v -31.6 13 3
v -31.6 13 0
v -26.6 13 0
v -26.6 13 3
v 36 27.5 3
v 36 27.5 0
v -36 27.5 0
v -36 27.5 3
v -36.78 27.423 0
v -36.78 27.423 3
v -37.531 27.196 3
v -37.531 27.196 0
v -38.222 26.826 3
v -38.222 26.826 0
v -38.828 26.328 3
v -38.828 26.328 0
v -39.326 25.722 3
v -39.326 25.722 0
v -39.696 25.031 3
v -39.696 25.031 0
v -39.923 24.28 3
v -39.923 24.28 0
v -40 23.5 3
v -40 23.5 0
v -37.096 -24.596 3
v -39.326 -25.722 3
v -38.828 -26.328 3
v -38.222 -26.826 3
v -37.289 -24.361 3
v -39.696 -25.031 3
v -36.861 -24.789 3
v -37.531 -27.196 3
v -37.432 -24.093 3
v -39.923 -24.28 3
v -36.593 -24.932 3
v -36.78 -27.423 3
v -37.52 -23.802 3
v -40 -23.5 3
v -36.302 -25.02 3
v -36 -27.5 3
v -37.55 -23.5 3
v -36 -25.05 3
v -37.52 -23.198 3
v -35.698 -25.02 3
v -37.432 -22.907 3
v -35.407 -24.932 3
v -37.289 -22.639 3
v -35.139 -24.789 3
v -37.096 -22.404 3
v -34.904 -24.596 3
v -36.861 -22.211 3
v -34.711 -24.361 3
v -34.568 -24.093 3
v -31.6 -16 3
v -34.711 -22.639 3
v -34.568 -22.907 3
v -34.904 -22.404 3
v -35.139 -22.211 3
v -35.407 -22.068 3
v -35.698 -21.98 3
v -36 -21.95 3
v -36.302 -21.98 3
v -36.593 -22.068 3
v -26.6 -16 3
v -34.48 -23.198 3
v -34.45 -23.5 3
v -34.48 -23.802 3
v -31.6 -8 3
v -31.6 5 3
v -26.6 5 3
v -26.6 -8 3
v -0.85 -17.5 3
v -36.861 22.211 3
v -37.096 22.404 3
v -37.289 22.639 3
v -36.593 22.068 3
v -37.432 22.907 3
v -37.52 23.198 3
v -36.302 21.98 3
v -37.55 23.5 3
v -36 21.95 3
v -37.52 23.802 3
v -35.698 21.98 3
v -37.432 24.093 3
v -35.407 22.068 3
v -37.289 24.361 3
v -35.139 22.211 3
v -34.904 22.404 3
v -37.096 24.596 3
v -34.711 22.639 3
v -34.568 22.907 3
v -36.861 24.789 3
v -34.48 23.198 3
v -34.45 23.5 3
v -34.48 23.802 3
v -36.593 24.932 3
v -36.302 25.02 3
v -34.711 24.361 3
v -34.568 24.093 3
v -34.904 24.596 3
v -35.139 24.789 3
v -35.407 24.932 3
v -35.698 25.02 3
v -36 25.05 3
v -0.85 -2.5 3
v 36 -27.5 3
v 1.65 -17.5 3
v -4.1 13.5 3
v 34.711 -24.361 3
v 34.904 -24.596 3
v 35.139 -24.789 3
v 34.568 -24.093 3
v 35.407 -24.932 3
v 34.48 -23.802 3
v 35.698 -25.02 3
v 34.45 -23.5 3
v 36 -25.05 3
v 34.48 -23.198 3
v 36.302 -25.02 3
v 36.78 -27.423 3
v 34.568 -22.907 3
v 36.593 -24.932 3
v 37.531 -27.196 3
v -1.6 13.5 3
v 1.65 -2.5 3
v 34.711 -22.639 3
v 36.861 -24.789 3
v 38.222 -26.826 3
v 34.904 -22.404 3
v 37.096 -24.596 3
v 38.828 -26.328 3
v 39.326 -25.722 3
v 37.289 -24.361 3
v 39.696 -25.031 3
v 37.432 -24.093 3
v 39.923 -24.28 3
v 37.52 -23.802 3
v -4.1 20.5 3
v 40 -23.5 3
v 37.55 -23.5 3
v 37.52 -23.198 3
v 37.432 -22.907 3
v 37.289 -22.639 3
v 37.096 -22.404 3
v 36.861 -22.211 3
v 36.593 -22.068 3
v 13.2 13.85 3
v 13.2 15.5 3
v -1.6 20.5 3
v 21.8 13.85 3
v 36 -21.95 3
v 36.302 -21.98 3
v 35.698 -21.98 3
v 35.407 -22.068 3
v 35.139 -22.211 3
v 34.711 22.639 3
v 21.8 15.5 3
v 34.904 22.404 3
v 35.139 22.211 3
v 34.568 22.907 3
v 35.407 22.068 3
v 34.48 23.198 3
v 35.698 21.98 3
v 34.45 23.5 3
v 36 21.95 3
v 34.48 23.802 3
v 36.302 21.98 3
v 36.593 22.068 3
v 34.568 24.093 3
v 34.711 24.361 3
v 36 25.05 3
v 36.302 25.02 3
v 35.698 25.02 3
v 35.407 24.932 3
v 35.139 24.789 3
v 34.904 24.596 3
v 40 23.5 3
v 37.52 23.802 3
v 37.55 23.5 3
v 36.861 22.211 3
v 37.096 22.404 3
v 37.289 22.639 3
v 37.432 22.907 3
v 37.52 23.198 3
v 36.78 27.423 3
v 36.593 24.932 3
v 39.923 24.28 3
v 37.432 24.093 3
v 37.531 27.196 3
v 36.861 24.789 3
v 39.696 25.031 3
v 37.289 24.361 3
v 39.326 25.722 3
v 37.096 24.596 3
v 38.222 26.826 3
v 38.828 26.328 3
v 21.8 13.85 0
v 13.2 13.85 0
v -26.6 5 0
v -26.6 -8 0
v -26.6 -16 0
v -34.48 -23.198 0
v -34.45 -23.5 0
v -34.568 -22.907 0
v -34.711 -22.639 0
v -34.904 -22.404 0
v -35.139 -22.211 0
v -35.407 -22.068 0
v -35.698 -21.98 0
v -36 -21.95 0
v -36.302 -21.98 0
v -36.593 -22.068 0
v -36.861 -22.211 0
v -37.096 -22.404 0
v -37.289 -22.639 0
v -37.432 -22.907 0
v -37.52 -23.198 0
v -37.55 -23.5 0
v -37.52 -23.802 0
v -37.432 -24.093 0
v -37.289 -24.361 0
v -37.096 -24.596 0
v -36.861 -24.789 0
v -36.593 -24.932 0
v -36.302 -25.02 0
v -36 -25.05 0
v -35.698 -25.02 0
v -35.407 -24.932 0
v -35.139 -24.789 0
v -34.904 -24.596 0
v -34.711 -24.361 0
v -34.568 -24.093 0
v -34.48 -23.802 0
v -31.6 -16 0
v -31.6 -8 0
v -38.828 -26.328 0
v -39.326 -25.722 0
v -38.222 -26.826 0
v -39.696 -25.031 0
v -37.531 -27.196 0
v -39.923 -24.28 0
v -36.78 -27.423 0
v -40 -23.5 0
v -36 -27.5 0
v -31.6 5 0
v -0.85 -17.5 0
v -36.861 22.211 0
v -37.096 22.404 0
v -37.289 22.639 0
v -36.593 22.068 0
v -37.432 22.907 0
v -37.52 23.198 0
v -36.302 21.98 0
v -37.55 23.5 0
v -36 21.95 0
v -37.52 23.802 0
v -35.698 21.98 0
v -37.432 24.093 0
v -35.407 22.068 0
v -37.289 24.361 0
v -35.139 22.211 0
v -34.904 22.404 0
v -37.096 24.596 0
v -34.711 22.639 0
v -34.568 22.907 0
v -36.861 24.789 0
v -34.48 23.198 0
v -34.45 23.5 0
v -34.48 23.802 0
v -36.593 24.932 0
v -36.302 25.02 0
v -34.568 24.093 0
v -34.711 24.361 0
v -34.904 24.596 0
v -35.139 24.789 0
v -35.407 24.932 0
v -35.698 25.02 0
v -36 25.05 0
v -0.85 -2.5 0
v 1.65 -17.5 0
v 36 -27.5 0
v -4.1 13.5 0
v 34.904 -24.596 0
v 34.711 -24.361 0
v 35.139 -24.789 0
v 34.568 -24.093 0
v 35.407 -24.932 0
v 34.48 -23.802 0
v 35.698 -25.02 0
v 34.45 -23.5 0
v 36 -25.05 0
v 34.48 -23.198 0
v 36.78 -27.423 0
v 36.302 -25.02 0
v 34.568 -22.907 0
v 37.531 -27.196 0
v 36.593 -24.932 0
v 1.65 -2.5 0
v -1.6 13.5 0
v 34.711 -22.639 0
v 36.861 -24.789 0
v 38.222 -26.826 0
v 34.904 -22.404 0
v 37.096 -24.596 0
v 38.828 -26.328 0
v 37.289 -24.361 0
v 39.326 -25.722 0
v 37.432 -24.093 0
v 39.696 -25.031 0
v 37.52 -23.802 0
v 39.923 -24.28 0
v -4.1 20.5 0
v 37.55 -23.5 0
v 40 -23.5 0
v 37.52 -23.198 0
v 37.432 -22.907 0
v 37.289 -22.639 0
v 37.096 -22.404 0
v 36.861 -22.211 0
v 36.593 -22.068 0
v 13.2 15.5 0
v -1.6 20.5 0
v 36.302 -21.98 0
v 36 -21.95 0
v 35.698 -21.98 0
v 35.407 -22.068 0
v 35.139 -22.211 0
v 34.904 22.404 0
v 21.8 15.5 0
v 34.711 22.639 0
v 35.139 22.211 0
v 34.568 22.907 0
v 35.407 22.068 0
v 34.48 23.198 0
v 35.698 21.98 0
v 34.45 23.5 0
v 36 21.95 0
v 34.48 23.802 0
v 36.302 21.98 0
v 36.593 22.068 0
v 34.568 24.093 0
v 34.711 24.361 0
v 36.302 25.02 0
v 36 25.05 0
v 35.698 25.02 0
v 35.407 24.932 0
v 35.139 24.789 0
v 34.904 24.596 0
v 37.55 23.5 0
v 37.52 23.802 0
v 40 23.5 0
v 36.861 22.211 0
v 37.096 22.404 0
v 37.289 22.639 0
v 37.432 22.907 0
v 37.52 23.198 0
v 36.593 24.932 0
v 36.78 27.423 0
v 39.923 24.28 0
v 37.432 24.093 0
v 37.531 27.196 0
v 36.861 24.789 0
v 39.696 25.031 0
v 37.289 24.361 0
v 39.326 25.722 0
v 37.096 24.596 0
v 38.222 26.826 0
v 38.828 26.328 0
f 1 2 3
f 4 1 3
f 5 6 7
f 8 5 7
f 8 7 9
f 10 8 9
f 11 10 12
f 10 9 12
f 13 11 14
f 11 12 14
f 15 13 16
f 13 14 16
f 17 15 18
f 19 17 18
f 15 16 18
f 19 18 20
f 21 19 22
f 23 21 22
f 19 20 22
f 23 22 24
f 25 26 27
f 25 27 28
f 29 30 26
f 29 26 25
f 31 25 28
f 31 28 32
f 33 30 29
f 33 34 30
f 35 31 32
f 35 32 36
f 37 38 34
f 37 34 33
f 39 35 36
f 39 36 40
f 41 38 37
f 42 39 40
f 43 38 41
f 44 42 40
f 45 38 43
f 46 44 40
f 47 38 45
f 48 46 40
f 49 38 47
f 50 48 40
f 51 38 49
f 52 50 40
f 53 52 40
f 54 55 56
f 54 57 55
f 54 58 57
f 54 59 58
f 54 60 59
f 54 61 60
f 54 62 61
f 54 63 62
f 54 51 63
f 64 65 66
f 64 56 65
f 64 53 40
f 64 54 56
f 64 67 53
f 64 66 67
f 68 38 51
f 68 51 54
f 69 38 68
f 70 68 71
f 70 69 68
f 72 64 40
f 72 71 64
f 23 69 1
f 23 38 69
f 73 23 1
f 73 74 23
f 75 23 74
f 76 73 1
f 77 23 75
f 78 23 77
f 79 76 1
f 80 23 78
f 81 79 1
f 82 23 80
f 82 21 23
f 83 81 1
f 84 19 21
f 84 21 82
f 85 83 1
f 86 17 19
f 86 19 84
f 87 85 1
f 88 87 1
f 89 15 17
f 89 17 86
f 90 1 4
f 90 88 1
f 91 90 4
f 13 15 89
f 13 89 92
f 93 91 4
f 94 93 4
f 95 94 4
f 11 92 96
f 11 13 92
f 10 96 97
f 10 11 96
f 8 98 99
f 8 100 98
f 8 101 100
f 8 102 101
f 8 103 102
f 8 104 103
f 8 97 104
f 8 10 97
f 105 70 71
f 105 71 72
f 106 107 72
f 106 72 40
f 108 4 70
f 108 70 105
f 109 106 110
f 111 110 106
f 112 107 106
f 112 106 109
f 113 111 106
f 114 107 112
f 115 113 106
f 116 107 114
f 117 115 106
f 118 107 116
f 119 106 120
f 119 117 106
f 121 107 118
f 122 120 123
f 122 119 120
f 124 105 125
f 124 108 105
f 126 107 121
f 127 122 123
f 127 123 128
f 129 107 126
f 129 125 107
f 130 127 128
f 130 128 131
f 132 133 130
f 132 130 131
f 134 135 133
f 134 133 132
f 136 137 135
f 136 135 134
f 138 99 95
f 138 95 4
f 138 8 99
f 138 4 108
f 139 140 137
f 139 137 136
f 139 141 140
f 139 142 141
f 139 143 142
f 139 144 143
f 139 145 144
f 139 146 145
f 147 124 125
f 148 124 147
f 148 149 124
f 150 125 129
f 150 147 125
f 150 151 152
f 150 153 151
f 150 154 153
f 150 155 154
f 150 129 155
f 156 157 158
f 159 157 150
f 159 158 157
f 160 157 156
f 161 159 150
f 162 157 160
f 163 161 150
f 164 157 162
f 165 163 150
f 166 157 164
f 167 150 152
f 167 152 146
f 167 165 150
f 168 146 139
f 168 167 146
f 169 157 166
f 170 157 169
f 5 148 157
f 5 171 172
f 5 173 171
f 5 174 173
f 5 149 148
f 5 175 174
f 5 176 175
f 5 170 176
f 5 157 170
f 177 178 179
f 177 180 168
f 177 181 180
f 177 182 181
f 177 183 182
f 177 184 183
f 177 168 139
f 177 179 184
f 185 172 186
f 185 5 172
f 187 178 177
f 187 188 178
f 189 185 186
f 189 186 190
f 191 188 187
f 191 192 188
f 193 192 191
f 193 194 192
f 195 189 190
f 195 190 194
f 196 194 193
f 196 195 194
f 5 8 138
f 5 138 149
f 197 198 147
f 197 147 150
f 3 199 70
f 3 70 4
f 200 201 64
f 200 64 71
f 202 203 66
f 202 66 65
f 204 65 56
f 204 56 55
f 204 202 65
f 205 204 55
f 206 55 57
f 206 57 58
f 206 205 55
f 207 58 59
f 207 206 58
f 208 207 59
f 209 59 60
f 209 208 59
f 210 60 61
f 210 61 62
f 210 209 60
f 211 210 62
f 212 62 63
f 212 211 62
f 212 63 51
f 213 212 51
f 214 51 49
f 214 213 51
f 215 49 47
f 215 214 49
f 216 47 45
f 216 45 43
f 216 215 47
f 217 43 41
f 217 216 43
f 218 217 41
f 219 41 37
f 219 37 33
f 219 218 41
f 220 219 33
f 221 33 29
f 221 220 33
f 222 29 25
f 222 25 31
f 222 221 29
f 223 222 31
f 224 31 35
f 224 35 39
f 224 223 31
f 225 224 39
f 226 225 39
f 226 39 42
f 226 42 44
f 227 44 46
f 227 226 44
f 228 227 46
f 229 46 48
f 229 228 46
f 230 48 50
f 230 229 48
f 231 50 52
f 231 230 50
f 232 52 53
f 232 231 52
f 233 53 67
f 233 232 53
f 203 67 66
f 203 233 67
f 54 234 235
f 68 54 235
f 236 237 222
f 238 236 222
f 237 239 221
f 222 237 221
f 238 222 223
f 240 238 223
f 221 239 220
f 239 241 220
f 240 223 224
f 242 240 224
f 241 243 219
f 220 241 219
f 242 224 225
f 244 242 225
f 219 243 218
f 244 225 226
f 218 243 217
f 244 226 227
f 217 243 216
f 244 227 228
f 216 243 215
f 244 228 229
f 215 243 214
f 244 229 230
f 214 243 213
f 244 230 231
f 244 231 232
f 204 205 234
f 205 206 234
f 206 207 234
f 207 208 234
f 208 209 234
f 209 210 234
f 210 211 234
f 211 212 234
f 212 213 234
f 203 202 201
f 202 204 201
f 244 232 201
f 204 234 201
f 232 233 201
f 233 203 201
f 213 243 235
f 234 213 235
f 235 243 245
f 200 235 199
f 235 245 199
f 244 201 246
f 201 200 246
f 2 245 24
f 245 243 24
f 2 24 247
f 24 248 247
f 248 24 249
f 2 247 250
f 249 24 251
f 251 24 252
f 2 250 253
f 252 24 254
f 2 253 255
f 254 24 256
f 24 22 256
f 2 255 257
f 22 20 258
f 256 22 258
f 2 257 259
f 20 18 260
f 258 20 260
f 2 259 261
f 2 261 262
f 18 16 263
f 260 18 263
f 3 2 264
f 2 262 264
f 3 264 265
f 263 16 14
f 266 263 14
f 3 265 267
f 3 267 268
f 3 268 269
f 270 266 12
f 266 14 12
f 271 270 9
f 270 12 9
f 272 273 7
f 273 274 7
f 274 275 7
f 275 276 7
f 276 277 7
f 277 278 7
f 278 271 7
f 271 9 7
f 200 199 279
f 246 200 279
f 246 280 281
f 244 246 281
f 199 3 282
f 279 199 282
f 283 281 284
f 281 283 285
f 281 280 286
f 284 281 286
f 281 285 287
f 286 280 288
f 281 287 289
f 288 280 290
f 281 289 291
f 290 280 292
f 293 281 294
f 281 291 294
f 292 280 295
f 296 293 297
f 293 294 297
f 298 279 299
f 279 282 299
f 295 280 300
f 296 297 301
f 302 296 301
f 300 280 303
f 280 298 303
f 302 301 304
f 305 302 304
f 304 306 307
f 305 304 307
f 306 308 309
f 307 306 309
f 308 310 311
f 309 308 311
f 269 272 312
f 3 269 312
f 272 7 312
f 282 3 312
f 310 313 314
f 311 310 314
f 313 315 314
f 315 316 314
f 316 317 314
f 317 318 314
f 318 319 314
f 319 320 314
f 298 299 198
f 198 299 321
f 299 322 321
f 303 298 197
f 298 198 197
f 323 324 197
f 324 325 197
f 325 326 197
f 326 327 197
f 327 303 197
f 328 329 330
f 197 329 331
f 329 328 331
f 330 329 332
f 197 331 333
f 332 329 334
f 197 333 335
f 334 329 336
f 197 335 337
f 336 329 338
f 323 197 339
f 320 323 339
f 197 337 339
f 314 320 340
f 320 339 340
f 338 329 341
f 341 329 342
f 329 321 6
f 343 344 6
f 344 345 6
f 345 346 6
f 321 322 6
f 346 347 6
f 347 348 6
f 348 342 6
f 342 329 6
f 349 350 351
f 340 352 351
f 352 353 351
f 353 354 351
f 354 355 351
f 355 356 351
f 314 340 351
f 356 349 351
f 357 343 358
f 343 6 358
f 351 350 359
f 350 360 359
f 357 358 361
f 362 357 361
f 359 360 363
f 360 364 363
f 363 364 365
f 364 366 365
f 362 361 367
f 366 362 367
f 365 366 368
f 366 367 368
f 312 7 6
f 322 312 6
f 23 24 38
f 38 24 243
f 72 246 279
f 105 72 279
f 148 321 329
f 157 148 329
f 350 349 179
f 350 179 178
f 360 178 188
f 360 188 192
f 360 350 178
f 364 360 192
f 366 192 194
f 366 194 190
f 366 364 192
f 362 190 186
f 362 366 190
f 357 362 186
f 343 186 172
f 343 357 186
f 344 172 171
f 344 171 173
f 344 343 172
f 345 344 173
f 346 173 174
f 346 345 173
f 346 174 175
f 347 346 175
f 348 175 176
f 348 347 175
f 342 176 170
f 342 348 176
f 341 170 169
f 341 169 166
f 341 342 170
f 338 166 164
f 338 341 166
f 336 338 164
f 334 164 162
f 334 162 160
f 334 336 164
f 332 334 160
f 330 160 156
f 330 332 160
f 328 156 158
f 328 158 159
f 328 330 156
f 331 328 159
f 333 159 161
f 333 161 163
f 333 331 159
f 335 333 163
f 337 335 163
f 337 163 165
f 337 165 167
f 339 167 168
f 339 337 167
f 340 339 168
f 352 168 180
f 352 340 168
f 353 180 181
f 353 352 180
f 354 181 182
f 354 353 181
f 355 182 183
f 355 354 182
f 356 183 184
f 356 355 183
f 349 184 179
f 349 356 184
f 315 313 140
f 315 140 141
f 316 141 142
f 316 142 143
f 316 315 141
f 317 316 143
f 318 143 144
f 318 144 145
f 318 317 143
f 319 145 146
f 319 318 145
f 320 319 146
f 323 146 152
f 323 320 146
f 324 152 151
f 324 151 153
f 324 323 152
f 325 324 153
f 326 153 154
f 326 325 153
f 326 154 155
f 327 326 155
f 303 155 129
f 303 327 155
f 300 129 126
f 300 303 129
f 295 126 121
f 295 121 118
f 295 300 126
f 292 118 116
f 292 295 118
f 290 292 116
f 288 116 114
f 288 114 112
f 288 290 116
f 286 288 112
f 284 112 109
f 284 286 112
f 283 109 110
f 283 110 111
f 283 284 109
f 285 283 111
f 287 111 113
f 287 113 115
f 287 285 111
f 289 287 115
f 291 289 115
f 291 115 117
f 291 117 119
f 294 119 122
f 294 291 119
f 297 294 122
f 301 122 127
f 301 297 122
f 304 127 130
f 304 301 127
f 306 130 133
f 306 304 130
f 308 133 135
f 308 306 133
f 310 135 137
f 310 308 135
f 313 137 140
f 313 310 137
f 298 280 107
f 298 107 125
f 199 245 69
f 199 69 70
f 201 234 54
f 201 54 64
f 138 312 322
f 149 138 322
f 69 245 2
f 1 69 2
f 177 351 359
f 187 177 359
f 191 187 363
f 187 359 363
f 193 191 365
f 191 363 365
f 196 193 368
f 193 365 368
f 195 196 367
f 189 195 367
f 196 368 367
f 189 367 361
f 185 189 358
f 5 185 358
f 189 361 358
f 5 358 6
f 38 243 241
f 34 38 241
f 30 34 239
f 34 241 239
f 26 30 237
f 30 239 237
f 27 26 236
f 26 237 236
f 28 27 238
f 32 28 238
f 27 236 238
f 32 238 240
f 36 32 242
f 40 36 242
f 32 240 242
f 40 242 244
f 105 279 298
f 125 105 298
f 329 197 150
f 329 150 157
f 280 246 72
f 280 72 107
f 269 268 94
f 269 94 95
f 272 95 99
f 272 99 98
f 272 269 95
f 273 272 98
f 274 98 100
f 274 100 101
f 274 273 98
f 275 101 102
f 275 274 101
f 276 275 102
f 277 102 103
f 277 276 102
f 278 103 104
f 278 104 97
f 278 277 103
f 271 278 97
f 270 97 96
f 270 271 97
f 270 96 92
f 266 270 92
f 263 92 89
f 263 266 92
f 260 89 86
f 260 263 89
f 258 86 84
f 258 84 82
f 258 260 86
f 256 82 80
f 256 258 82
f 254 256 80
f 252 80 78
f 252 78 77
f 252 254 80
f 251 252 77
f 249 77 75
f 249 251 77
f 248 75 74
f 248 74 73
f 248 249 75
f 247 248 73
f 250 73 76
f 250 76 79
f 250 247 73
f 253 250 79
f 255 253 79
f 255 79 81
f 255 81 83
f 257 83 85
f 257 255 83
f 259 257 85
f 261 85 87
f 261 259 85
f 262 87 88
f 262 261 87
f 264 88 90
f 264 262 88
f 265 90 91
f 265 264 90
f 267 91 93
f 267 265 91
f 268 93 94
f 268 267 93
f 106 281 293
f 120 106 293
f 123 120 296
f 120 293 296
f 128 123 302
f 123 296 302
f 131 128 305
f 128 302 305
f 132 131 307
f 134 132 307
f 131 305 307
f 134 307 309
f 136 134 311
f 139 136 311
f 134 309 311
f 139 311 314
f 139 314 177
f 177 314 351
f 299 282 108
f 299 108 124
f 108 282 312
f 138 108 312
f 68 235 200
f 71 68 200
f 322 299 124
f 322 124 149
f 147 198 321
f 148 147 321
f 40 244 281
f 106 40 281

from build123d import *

# Parameters (mm, degrees)
ESQUISSE1_R        = 1.55
ESQUISSE1_W        = 5
ESQUISSE1_H        = 8
ESQUISSE1_W_2      = 2.5
ESQUISSE1_H_2      = 15
ESQUISSE1_H_3      = 7
ESQUISSE1_W_3      = 8.6
ESQUISSE1_H_4      = 1.65
BOSS_EXTRU_1_DEPTH = 3


with BuildPart() as part:
    # Esquisse1 → Boss.-Extru.1 (new body)
    with BuildSketch(Plane.XY):
        with BuildLine():
            Line((36, 27.5), (-36, 27.5))
            ThreePointArc((-36, 27.5), (-38.828427125, 26.328427125), (-40, 23.5))
            Line((-40, 23.5), (-40, -23.5))
            ThreePointArc((-40, -23.5), (-38.828427125, -26.328427125), (-36, -27.5))
            Line((-36, -27.5), (36, -27.5))
            ThreePointArc((36, -27.5), (38.828427125, -26.328427125), (40, -23.5))
            Line((40, -23.5), (40, 23.5))
            ThreePointArc((40, 23.5), (38.828427125, 26.328427125), (36, 27.5))
        make_face()
        with Locations((-36, 23.5)):
            Circle(ESQUISSE1_R, mode=Mode.SUBTRACT)
        with Locations((-36, -23.5)):
            Circle(ESQUISSE1_R, mode=Mode.SUBTRACT)
        with Locations((36, -23.5)):
            Circle(ESQUISSE1_R, mode=Mode.SUBTRACT)
        with Locations((36, 23.5)):
            Circle(ESQUISSE1_R, mode=Mode.SUBTRACT)
        with Locations((-29.1, -12)):
            Rectangle(ESQUISSE1_W, ESQUISSE1_H, mode=Mode.SUBTRACT)
        with Locations((-29.1, 9)):
            Rectangle(ESQUISSE1_W, ESQUISSE1_H, mode=Mode.SUBTRACT)
        with Locations((0.4, -10)):
            Rectangle(ESQUISSE1_W_2, ESQUISSE1_H_2, mode=Mode.SUBTRACT)
        with Locations((-2.85, 17)):
            Rectangle(ESQUISSE1_W_2, ESQUISSE1_H_3, mode=Mode.SUBTRACT)
        with Locations((17.5, 14.675)):
            Rectangle(ESQUISSE1_W_3, ESQUISSE1_H_4, mode=Mode.SUBTRACT)
    extrude(amount=BOSS_EXTRU_1_DEPTH)


solid = part.part
